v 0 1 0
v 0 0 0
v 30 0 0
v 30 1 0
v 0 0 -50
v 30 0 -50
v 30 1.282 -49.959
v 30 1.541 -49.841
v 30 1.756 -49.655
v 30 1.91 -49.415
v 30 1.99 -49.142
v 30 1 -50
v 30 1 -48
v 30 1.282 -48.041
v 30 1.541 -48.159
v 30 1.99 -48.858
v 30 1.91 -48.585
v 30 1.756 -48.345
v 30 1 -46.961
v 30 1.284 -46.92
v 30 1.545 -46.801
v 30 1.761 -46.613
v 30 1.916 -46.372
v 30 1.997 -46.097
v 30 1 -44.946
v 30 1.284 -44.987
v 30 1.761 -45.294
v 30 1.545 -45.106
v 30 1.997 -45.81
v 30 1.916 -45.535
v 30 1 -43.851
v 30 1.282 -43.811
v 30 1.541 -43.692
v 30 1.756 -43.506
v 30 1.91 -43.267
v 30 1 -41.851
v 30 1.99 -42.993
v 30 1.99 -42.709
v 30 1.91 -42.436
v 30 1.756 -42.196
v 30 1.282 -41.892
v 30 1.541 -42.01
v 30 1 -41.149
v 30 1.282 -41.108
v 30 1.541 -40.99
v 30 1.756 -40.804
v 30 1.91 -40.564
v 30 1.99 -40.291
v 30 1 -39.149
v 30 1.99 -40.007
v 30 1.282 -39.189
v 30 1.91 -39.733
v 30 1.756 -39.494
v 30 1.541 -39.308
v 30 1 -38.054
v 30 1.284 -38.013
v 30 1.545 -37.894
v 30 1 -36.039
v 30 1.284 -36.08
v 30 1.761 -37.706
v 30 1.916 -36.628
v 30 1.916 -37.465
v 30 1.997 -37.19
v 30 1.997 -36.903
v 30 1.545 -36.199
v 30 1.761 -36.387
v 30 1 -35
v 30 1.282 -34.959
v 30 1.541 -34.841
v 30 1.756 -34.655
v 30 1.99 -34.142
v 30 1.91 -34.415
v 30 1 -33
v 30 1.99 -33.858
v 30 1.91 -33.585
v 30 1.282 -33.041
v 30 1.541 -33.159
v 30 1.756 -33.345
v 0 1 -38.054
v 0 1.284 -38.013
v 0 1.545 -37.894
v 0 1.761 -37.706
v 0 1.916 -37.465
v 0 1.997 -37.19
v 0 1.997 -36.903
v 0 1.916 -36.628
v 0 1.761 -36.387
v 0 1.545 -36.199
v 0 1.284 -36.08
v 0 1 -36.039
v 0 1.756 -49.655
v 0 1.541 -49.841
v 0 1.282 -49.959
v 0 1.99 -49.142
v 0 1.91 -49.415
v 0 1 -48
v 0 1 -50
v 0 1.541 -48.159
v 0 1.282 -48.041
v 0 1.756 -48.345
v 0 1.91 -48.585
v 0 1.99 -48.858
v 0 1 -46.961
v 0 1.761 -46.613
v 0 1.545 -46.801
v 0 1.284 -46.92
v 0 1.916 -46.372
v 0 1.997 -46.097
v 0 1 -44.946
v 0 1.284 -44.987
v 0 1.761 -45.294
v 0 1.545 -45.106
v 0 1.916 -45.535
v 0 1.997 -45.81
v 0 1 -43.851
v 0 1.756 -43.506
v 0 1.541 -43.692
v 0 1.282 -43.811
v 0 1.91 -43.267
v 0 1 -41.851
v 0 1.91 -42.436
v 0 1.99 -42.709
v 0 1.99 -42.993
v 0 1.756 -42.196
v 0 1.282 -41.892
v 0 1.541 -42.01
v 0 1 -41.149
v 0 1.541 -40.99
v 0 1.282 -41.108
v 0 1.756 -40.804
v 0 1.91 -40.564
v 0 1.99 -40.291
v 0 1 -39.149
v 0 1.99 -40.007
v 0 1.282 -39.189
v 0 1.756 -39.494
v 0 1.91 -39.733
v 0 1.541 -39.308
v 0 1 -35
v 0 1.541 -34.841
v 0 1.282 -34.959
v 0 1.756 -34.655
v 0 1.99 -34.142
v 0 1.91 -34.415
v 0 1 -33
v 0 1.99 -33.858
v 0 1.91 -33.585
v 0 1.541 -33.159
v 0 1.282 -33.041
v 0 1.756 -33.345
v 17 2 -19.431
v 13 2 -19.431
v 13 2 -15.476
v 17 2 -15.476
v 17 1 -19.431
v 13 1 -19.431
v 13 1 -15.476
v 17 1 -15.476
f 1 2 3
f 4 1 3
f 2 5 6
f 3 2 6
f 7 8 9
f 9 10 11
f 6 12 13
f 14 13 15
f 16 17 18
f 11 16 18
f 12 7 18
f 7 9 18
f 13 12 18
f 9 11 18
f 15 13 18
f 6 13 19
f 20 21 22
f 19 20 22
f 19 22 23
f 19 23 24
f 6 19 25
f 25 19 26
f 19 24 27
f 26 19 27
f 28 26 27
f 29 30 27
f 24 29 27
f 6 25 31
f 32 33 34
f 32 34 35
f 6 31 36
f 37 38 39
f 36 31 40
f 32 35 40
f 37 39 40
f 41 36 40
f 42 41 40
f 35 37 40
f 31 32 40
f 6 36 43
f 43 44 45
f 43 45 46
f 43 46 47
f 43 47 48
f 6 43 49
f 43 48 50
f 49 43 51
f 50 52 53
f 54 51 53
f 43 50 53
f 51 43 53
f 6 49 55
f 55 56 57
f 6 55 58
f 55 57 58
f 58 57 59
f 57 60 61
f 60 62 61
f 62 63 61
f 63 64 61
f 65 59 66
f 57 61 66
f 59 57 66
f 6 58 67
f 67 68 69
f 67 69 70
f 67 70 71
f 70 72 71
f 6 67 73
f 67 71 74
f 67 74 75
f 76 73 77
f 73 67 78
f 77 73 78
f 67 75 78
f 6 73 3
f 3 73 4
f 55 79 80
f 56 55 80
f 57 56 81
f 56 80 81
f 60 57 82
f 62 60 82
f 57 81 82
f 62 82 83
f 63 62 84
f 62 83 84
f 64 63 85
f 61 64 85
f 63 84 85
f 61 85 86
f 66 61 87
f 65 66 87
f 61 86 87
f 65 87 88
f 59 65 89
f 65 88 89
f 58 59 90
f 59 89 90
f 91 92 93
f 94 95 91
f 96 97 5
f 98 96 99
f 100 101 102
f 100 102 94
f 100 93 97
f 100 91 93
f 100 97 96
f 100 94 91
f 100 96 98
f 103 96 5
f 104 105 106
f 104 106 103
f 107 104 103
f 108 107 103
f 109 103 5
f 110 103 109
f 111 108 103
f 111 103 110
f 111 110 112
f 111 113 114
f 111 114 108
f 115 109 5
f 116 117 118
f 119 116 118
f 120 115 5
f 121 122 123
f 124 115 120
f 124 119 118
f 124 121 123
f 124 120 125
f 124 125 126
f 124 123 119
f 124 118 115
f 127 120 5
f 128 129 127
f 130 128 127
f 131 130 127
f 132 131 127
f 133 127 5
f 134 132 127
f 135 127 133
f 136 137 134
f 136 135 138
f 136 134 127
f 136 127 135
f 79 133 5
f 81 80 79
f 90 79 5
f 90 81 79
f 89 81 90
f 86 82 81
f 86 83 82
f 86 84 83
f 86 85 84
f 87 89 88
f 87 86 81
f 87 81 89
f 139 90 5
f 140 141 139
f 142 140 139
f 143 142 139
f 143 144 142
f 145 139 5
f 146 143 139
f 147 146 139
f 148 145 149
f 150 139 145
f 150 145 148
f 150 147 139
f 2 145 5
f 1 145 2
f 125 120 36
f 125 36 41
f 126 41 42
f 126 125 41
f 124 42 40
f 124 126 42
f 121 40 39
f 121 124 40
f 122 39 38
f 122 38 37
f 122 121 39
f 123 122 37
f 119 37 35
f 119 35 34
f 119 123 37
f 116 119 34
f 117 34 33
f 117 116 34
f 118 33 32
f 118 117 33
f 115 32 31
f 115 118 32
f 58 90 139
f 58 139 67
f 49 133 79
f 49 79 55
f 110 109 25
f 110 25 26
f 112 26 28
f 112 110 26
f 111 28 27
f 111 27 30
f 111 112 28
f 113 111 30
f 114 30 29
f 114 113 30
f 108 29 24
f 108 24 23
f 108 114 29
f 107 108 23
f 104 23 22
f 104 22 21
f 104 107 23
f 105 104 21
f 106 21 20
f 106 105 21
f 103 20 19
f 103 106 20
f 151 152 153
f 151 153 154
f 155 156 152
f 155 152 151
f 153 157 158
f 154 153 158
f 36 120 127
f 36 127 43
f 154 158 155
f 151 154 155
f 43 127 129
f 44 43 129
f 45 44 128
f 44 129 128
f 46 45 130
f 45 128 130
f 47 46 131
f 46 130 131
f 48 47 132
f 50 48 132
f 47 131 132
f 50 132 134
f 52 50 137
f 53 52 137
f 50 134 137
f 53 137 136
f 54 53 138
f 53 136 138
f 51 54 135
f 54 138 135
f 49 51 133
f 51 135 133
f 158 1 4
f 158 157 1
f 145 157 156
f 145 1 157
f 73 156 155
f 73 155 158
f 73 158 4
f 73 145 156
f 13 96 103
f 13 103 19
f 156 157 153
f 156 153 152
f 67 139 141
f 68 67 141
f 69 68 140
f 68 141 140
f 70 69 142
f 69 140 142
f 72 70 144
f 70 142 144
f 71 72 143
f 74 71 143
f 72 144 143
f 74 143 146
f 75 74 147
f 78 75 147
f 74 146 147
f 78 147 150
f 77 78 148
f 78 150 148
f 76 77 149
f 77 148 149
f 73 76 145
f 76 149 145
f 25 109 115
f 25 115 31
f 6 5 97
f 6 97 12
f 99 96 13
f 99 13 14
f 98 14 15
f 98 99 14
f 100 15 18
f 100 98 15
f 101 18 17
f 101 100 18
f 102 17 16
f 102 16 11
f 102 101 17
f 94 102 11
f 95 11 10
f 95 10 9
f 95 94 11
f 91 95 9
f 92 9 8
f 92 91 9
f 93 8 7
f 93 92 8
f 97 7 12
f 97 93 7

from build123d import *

# Parameters (mm, degrees)
SKETCH1_W           = 30
SKETCH1_H           = 50
BOSS_EXTRUDE1_DEPTH = 1
BOSS_EXTRUDE2_DEPTH = 30
BOSS_EXTRUDE3_DEPTH = 30
BOSS_EXTRUDE5_DEPTH = 30
SKETCH8_W           = 4
SKETCH8_H           = 3.954682566
BOSS_EXTRUDE6_DEPTH = 1


with BuildPart() as part:
    # Sketch1 → Boss-Extrude1 (new body)
    with BuildSketch(Plane(origin=(0, 0, 0), x_dir=(1, 0, 0), z_dir=(0, 1, 0))):
        with Locations((15, 25)):
            Rectangle(SKETCH1_W, SKETCH1_H)
    extrude(amount=BOSS_EXTRUDE1_DEPTH)

    # Sketch3 → Boss-Extrude2 (add)
    with BuildSketch(Plane.ZY):
        with BuildLine():
            Line((-50, 1), (-48, 1))
            ThreePointArc((-48, 1), (-49, 2), (-50, 1))
        make_face()
    boss_extrude2 = extrude(amount=-BOSS_EXTRUDE2_DEPTH)

    # Sketch5 → Boss-Extrude3 (add)
    with BuildSketch(Plane.ZY):
        with BuildLine():
            Line((-46.960567447, 1), (-44.946165632, 1))
            ThreePointArc((-44.946165632, 1), (-45.953366539, 2.007200908), (-46.960567447, 1))
        make_face()
    boss_extrude3 = extrude(amount=-BOSS_EXTRUDE3_DEPTH)

    # Sketch7 → Boss-Extrude5 (add)
    with BuildSketch(Plane.ZY):
        with BuildLine():
            Line((-43.851141388, 1), (-41.851141388, 1))
            ThreePointArc((-41.851141388, 1), (-42.851141388, 2), (-43.851141388, 1))
        make_face()
    boss_extrude5 = extrude(amount=-BOSS_EXTRUDE5_DEPTH)

    # Mirror1: Boss-Extrude2, Boss-Extrude3, Boss-Extrude5 across plane
    add(boss_extrude2.mirror(Plane(origin=(0, 0, -41.5), x_dir=(1, 0, 0), z_dir=(0, 0, -1))))
    add(boss_extrude3.mirror(Plane(origin=(0, 0, -41.5), x_dir=(1, 0, 0), z_dir=(0, 0, -1))))
    add(boss_extrude5.mirror(Plane(origin=(0, 0, -41.5), x_dir=(1, 0, 0), z_dir=(0, 0, -1))))

    # Sketch8 → Boss-Extrude6 (add)
    with BuildSketch(Plane(origin=(0, 1, 0), x_dir=(1, 0, 0), z_dir=(0, 1, 0))):
        with Locations((15, 17.453820001)):
            Rectangle(SKETCH8_W, SKETCH8_H)
    extrude(amount=BOSS_EXTRUDE6_DEPTH)


solid = part.part
